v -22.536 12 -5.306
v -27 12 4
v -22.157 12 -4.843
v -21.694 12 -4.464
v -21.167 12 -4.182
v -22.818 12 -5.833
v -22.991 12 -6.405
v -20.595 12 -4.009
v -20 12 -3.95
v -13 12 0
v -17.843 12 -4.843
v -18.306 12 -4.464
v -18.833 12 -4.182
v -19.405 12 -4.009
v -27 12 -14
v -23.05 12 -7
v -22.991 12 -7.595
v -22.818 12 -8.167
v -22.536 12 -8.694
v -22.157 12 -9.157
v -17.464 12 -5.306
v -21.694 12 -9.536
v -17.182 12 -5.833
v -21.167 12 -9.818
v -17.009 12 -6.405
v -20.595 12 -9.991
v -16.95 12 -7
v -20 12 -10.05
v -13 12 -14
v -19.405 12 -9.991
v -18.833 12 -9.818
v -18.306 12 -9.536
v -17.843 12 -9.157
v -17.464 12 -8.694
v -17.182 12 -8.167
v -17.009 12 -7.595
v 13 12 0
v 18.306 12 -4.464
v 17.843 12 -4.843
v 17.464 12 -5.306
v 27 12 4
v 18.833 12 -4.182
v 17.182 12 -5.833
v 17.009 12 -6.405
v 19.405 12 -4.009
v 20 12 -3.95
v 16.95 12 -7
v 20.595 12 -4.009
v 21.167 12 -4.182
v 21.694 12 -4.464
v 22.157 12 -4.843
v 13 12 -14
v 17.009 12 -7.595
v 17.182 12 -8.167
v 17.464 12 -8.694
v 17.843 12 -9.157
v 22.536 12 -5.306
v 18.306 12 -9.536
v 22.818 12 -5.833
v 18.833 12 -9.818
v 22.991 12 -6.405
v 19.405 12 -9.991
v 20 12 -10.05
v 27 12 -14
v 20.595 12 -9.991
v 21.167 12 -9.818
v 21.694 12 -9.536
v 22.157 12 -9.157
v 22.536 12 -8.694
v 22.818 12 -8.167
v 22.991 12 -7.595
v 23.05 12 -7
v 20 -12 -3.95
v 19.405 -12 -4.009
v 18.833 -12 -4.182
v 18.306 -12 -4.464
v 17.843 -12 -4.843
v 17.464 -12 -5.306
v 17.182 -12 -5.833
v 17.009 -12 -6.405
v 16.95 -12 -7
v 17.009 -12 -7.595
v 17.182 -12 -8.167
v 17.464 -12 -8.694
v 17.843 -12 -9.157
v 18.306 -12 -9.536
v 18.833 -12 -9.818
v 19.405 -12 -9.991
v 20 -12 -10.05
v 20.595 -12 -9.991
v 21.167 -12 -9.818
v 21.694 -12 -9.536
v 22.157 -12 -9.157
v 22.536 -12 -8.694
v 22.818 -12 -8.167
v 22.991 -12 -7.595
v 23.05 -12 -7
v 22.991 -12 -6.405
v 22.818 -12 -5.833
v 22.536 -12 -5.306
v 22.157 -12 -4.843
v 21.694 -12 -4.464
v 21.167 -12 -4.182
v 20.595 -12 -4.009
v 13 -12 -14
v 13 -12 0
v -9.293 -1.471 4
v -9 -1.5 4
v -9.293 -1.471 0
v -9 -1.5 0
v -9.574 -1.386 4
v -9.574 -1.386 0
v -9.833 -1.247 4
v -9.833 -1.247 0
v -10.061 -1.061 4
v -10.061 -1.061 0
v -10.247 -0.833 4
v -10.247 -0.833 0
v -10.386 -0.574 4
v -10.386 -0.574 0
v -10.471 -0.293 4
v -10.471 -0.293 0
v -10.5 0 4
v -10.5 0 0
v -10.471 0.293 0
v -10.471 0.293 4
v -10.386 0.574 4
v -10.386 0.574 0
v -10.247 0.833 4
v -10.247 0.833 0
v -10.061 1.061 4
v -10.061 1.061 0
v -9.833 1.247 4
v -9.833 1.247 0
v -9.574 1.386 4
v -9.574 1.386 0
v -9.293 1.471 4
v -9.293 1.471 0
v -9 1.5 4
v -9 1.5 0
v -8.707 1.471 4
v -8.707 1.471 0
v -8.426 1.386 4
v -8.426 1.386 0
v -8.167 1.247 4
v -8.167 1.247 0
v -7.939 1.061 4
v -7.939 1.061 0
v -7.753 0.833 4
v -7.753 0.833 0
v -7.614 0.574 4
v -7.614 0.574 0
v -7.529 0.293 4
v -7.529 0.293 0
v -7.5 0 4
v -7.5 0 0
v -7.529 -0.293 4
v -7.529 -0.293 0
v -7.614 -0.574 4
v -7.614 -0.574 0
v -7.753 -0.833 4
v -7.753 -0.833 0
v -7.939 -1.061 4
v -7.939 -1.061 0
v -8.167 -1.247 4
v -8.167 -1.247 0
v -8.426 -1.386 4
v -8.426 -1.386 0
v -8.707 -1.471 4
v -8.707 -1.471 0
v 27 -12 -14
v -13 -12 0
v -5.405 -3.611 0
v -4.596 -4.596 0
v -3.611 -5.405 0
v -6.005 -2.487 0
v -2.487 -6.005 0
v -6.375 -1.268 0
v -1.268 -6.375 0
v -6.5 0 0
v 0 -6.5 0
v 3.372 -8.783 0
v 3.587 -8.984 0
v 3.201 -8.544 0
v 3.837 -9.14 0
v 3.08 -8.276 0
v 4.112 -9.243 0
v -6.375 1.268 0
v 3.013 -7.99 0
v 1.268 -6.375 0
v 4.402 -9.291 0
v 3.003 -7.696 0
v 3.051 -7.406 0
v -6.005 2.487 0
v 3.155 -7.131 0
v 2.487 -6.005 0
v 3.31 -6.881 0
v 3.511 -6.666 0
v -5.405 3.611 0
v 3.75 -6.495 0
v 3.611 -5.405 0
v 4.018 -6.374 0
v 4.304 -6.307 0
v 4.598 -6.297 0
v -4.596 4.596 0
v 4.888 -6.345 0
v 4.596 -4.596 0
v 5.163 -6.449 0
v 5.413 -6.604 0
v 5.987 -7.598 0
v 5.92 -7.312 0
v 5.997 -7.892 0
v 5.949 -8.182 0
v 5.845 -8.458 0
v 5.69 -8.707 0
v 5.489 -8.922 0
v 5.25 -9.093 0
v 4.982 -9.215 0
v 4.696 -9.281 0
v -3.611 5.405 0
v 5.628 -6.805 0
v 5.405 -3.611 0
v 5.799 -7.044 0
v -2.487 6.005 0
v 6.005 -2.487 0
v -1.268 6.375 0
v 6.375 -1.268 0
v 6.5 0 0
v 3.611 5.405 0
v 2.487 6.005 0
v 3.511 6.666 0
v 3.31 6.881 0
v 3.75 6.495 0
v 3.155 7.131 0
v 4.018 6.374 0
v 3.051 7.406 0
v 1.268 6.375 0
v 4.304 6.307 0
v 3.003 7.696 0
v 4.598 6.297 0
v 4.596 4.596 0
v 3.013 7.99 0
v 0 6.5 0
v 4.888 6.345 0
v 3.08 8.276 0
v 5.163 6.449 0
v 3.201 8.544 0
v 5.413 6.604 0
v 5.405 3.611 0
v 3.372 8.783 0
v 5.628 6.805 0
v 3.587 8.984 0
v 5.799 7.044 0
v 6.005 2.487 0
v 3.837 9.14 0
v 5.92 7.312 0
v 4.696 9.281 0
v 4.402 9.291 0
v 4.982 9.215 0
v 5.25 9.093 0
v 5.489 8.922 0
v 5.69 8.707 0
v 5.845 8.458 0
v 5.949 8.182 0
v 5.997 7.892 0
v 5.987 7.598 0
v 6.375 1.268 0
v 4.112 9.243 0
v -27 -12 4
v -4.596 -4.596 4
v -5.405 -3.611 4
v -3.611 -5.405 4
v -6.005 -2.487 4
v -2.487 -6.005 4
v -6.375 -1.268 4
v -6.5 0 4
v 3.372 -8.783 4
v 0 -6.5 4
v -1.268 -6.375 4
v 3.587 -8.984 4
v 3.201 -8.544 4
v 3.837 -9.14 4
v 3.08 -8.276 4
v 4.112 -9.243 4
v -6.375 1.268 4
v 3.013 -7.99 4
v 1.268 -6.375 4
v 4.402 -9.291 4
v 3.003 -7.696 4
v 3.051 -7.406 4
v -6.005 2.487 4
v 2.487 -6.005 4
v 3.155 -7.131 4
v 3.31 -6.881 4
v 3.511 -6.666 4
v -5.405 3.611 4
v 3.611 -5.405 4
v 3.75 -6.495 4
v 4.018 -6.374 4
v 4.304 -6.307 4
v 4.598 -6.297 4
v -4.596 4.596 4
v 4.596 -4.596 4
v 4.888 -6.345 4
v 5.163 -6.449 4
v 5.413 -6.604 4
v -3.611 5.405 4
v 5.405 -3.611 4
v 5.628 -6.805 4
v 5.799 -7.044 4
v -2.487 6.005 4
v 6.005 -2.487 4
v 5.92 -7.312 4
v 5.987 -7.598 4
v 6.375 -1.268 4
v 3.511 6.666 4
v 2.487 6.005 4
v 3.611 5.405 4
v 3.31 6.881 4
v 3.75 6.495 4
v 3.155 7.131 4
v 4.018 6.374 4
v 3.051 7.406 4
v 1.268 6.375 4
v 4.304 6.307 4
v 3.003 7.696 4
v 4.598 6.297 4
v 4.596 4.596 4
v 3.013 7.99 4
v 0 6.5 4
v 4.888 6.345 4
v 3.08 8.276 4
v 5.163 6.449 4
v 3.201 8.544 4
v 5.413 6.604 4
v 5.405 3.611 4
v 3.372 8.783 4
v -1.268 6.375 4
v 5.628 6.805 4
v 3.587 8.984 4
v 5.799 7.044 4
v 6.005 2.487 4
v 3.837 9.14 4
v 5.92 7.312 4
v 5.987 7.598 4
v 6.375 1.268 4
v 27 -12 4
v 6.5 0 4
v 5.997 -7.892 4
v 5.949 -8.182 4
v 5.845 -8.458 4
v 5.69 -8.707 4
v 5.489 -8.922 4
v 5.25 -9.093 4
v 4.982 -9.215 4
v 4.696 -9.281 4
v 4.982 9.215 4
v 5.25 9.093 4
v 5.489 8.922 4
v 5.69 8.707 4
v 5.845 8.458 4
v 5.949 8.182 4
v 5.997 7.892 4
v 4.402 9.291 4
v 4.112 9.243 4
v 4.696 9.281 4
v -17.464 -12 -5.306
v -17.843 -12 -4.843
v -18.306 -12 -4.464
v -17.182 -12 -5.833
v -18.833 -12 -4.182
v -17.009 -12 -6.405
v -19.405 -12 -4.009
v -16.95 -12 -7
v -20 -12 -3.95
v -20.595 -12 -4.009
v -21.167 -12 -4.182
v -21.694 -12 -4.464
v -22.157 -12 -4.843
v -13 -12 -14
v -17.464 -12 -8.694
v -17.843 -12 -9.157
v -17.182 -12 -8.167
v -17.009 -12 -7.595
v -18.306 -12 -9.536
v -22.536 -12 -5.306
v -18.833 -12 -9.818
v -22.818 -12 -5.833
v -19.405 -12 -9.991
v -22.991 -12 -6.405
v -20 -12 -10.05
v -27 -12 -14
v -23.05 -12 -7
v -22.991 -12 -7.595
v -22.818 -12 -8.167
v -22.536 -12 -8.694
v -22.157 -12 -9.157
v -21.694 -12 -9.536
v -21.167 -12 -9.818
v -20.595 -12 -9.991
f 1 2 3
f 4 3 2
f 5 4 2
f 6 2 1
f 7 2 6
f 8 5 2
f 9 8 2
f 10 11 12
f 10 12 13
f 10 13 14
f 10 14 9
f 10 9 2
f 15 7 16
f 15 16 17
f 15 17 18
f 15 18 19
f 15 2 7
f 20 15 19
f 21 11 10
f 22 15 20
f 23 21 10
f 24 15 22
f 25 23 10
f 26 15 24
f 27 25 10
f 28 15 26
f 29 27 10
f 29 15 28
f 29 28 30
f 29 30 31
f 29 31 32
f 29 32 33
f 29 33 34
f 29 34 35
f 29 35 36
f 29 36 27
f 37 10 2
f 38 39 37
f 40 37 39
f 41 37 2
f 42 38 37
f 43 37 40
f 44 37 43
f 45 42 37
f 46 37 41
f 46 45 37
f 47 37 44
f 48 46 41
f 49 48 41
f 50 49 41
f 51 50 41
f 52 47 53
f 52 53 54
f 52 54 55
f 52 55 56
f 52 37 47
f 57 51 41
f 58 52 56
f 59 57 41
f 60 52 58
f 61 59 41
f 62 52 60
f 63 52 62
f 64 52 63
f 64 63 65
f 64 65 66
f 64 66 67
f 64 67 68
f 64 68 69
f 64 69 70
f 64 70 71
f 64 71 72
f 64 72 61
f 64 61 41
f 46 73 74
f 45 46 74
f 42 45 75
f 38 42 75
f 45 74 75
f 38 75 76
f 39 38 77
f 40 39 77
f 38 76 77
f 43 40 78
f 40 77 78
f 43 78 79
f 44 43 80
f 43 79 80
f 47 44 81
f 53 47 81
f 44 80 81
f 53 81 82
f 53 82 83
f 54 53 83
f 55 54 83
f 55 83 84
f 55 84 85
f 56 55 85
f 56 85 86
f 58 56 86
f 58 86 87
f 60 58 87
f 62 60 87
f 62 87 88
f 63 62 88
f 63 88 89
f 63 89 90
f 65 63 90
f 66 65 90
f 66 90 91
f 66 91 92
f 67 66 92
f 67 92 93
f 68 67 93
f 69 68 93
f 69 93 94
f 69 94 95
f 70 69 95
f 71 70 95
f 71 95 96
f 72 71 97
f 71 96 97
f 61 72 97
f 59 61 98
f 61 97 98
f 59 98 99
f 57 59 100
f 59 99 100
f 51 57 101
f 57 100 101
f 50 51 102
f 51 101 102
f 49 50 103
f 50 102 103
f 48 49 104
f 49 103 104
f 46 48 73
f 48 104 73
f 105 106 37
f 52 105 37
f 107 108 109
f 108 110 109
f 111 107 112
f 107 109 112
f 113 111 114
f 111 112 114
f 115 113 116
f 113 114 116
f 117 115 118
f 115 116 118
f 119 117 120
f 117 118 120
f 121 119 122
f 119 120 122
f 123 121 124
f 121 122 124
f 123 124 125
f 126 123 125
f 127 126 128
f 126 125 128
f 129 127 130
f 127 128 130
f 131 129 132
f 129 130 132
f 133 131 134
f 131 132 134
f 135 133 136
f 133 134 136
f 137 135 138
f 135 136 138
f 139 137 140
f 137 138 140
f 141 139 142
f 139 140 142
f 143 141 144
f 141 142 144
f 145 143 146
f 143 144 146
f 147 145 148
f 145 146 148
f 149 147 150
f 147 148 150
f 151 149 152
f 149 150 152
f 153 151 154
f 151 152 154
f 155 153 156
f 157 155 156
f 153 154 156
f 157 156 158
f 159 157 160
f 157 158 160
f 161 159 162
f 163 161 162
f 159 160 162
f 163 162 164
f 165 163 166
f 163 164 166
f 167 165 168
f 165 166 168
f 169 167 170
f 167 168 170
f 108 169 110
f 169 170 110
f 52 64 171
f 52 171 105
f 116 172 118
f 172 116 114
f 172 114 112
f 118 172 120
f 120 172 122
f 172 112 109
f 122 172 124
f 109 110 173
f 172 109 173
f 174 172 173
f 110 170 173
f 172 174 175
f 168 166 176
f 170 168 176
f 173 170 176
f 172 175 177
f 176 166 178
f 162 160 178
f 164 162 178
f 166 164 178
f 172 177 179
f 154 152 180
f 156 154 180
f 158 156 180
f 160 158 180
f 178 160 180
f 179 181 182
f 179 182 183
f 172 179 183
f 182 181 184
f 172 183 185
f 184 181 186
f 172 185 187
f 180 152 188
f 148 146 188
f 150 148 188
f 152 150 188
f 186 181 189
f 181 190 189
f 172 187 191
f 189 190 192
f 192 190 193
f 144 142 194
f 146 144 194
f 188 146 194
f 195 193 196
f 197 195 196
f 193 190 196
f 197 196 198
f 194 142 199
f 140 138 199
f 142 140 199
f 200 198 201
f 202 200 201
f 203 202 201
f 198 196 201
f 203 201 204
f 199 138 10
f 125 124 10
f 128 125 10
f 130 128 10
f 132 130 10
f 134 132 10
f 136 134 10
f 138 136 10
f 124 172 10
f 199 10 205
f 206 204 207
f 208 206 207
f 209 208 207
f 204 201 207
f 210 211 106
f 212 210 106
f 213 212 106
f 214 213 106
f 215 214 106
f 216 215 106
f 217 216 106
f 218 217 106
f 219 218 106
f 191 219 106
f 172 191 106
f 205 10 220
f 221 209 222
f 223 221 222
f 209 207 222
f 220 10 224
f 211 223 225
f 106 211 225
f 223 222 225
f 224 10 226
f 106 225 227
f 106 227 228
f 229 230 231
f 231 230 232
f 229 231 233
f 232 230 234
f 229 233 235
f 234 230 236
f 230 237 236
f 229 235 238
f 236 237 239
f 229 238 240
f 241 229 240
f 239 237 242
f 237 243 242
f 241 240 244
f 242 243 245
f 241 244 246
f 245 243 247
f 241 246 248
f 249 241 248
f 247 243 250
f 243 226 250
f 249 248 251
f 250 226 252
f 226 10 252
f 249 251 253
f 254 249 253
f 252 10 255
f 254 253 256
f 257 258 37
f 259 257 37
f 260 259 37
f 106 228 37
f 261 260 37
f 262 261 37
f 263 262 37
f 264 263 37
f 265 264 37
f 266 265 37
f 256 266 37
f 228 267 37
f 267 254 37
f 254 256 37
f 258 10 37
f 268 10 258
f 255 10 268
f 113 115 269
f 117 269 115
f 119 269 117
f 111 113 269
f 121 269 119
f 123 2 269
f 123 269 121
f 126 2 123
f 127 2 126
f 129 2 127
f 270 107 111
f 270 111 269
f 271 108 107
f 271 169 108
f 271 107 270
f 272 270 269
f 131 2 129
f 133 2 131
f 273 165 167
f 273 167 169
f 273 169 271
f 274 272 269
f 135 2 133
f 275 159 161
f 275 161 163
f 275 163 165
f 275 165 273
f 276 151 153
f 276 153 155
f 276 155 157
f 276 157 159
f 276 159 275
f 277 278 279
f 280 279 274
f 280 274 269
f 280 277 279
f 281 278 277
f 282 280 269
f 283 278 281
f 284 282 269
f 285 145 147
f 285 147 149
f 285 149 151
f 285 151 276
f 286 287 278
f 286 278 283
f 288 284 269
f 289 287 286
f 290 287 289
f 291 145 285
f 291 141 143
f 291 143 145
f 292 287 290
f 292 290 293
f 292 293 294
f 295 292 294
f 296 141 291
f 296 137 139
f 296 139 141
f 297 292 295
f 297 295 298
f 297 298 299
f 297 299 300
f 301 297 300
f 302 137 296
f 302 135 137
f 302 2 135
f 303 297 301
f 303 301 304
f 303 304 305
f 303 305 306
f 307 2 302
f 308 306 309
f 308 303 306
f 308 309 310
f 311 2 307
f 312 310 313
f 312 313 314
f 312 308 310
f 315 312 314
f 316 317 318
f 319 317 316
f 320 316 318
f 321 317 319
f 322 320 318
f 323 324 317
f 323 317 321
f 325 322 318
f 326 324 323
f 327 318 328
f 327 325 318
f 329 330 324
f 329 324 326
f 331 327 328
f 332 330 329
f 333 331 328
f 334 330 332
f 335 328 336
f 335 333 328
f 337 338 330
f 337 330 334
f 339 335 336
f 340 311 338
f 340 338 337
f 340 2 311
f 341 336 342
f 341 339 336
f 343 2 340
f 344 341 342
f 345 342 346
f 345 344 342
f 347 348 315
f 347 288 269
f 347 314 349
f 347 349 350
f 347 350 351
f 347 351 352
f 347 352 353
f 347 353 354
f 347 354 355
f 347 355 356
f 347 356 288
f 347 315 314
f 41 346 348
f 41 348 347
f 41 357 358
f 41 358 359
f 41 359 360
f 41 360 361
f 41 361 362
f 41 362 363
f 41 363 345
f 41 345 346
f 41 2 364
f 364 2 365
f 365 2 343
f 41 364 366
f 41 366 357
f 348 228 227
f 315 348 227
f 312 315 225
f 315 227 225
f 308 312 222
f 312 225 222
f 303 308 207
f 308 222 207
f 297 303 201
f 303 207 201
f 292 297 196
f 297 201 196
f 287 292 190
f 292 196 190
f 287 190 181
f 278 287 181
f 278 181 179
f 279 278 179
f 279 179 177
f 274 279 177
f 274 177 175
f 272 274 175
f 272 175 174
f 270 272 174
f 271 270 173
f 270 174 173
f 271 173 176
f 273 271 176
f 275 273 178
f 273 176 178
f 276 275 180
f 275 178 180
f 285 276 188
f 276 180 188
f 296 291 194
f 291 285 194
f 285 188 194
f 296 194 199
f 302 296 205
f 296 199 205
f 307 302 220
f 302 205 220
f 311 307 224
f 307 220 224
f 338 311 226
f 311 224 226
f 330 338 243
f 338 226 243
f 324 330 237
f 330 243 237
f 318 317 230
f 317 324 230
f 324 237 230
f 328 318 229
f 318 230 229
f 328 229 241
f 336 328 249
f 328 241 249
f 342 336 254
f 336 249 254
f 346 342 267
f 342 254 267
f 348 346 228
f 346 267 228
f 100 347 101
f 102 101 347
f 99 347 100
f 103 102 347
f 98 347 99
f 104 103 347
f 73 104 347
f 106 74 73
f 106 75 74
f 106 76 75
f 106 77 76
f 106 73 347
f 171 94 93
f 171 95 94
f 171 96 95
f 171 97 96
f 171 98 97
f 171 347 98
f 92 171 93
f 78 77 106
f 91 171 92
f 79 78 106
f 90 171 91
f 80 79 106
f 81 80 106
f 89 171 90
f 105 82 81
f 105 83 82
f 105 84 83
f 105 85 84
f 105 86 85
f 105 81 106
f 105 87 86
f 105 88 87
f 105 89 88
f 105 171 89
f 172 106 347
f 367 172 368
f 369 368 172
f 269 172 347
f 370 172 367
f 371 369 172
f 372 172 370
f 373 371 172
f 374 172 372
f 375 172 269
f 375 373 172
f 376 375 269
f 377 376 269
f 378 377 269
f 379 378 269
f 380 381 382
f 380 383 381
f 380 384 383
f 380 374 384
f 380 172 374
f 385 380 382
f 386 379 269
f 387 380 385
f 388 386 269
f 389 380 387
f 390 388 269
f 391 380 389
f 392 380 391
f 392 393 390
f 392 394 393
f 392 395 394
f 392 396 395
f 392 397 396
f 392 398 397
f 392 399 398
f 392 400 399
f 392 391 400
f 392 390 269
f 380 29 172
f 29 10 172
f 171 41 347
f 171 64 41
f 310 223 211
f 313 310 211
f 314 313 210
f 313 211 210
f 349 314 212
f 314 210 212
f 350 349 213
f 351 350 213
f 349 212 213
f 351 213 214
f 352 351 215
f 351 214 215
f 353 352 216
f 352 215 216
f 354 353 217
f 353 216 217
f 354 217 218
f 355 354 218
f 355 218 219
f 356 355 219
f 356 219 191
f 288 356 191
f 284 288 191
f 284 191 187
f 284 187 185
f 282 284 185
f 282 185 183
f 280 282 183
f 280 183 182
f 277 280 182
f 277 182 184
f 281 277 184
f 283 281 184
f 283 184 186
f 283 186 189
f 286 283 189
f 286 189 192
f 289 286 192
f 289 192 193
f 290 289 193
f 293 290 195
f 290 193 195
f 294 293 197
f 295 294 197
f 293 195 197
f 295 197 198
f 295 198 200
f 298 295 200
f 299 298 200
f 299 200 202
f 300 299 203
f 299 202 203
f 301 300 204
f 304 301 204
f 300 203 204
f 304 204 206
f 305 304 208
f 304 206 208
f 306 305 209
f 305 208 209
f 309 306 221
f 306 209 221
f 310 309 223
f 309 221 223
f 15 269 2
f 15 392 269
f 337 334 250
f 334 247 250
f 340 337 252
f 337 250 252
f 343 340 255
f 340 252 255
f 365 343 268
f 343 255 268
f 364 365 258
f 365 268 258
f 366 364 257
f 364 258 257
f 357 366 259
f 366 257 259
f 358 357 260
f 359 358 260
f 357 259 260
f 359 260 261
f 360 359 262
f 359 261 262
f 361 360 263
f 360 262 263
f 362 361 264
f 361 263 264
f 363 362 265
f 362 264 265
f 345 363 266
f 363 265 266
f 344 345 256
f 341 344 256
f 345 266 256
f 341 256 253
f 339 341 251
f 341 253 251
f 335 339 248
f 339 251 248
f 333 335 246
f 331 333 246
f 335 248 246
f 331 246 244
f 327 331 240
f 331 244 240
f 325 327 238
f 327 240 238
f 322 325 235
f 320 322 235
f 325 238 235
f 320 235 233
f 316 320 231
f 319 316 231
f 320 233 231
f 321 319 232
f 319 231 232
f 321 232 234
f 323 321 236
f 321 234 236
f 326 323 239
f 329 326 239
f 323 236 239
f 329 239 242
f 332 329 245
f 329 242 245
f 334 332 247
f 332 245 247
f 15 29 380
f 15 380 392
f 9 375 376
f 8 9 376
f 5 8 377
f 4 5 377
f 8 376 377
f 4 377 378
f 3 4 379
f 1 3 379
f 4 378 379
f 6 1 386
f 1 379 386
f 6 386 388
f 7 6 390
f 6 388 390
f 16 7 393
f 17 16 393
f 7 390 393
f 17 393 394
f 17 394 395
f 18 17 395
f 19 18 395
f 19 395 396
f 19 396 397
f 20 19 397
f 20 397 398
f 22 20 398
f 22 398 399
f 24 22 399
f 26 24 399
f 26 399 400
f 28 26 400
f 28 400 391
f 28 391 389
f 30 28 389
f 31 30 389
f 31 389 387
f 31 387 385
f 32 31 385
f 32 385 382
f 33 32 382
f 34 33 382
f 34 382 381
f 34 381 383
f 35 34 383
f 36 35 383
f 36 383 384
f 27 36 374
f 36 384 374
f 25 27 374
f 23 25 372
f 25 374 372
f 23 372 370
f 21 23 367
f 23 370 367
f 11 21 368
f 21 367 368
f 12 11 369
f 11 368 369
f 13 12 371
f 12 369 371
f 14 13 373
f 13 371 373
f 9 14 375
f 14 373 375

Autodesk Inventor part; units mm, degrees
ref_plane "YZ Plane" through (0, 0, 0) normal (1, 0, 0) x (0, 1, 0)
ref_plane "XZ Plane" through (0, 0, 0) normal (0, 1, 0) x (-1, 0, 0)
ref_plane "XY Plane" through (0, 0, 0) normal (0, 0, 1) x (1, 0, 0)
sketch "Skizze1" plane through (0, 0, 0) normal (0, 0, 1) x (1, 0, 0)
  circle A0 centre (0, 0) radius 6.5
  line L0 (-27, 12) -> (27, 12)
  line L1 (27, 12) -> (27, -12)
  line L2 (27, -12) -> (-27, -12)
  line L3 (-27, -12) -> (-27, 12)
  dimension "d0" = 13
  dimension "d1" = 24
  dimension "d2" = 12
  dimension "d3" = 54
  dimension "d4" = 27
extrude "Extrusion1" add sketch "Skizze1" along normal blind 4
sketch "Skizze2" plane through (0, 0, 0) normal (0, 0, -1) x (-1, 0, 0)
  line L0 (-27, -12) -> (-13, -12)
  line L1 (-13, -12) -> (-13, 12)
  line L2 (-13, 12) -> (-27, 12)
  line L3 (-27, 12) -> (-27, -12)
  line L4 (13, -12) -> (27, -12)
  line L5 (27, -12) -> (27, 12)
  line L6 (27, 12) -> (13, 12)
  line L7 (13, 12) -> (13, -12)
  point P0 (0, 0)
  dimension "d7" = 14
  dimension "d8" = 14
  dimension "d9" = 24
  dimension "d10" = 24
  dimension "d11" = 27
  dimension "d12" = 27
  dimension "d13" = 12
extrude "Extrusion2" add sketch "Skizze2" along normal blind 14
hole "Bohrung1" at (20, 12, -7) direction (0, -1, 0) diameter 6.1 depth 24
hole "Bohrung2" at (-20, 12, -7) direction (0, -1, 0) diameter 6.1 depth 724
hole "Bohrung3" at (-9, 0, 4) direction (0, 0, -1) diameter 3 depth 8 tip angle 118
pattern_circular "Runde Anordnung1" count 3 over 360 about axis through (0, 0, 0) along (0, 0, 1) of "Bohrung3"
properties part number "B Arm"
